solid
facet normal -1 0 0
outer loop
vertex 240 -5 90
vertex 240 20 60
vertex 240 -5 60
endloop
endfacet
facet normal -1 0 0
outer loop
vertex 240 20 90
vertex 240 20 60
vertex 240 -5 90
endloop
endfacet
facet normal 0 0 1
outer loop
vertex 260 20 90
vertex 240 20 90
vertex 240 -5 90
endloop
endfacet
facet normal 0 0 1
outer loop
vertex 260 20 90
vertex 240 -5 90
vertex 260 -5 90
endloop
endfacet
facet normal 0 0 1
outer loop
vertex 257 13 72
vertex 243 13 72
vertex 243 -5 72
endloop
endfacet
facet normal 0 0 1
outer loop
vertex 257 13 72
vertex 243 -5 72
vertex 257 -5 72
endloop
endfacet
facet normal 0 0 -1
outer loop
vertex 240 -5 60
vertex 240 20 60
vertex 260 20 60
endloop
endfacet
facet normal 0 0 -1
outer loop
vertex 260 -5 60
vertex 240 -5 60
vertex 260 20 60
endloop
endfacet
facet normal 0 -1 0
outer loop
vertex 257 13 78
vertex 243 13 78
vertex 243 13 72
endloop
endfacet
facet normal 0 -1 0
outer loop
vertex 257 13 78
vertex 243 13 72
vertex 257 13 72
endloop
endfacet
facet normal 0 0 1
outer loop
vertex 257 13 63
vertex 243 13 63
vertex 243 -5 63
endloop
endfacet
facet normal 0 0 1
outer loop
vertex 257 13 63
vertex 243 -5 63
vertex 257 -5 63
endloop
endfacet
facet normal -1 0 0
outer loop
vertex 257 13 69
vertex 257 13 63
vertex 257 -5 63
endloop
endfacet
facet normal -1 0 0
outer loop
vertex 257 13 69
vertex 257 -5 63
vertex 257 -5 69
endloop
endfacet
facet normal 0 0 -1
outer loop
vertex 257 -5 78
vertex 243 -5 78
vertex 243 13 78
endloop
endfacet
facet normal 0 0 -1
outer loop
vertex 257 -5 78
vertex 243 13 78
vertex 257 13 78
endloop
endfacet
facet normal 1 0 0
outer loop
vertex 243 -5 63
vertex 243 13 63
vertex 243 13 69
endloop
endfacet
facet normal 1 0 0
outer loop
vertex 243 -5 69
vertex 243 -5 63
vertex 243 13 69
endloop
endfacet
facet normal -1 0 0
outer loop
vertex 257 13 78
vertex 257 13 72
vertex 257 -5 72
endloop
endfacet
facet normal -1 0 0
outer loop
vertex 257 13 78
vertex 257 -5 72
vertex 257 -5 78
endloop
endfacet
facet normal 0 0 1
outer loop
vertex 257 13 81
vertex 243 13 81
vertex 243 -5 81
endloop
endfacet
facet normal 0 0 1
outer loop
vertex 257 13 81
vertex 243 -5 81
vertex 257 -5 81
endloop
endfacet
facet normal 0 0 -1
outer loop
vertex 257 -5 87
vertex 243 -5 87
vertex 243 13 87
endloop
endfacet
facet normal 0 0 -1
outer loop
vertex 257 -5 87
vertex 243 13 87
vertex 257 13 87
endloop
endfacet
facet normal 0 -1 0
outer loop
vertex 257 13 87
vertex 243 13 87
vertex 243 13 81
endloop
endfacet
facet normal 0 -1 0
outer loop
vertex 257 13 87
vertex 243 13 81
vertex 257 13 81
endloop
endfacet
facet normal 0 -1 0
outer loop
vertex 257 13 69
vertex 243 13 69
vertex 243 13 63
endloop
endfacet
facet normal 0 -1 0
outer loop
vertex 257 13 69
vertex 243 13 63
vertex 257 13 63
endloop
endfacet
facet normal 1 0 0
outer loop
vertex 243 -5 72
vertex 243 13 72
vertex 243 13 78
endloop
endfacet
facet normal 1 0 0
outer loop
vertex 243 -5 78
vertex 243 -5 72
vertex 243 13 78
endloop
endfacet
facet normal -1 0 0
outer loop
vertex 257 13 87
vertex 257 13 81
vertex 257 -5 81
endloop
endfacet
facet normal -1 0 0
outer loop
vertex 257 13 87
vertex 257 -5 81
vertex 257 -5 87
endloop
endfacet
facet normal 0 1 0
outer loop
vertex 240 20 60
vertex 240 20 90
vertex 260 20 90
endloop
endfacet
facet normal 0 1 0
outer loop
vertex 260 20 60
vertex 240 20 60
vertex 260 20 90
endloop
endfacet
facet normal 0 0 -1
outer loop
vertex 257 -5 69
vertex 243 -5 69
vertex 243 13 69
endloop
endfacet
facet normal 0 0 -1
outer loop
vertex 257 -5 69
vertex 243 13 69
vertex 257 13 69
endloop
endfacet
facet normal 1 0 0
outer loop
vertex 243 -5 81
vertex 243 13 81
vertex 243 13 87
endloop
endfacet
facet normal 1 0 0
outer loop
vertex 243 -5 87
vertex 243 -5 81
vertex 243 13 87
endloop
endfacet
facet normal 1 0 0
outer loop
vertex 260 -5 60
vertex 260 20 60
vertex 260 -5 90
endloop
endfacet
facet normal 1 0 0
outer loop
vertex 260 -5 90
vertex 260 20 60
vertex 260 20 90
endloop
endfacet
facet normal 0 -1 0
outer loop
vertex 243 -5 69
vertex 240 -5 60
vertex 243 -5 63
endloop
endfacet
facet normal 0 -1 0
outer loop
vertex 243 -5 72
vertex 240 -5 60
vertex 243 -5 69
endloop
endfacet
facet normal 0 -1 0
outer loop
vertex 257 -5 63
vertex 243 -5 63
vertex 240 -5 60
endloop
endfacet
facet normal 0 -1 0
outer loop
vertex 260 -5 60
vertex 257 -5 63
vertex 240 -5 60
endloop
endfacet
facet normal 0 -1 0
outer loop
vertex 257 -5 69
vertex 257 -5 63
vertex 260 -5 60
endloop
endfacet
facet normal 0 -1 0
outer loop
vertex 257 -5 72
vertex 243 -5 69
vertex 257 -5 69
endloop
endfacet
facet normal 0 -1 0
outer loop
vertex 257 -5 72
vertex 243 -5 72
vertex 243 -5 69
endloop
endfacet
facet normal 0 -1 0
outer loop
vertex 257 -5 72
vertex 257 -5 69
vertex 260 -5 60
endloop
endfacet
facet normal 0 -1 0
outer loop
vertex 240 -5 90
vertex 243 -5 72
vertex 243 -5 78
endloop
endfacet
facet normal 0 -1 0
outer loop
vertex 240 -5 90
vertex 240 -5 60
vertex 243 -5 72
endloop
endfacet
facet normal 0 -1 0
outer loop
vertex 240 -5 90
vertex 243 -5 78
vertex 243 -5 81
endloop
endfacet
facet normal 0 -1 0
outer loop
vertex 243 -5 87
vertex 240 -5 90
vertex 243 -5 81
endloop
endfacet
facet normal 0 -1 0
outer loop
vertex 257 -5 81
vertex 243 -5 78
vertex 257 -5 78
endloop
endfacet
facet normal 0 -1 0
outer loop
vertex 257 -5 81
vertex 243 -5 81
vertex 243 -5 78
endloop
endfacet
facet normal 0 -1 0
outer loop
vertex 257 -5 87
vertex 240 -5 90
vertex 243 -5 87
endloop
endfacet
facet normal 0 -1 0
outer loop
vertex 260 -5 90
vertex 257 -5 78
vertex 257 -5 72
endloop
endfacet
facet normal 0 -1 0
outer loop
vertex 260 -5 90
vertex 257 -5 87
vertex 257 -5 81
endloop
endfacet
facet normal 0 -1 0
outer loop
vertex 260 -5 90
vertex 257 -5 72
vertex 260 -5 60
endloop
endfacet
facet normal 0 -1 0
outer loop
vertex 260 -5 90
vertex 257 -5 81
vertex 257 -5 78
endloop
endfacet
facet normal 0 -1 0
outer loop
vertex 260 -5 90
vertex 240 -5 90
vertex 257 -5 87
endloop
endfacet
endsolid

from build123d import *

# Parameters (mm, degrees)
BOX020_W          = 14
BOX020_H          = 6
BOX020_DEPTH      = 20
BOX020_ROLL_ANGLE = 90
BOX021_W          = 14
BOX021_H          = 6
BOX021_DEPTH      = 20
BOX021_ROLL_ANGLE = 90
BOX019_W          = 14
BOX019_H          = 6
BOX019_DEPTH      = 20
BOX019_ROLL_ANGLE = 90
BOX018_W          = 20
BOX018_H          = 30
BOX018_DEPTH      = 25
BOX018_ROLL_ANGLE = 90


with BuildPart() as usb_plug002:
    # Box020 → Box020 (new body)
    with BuildSketch(Plane.XY):
        with Locations((7, 3)):
            Rectangle(BOX020_W, BOX020_H)
    extrude(amount=BOX020_DEPTH)


with BuildPart() as usb_plug002_1:
    # Box020 roll: moved
    add(usb_plug002.part.rotate(Axis((0, 0, 0), (1, 0, 0)), BOX020_ROLL_ANGLE))


with BuildPart() as usb_plug002_2:
    # Box020 placement: moved
    add(usb_plug002_1.part.moved(Location((243, 13, 112))))


with BuildPart() as usb_plug003:
    # Box021 → Box021 (new body)
    with BuildSketch(Plane.XY):
        with Locations((7, 3)):
            Rectangle(BOX021_W, BOX021_H)
    extrude(amount=BOX021_DEPTH)


with BuildPart() as usb_plug003_1:
    # Box021 roll: moved
    add(usb_plug003.part.rotate(Axis((0, 0, 0), (1, 0, 0)), BOX021_ROLL_ANGLE))


with BuildPart() as usb_plug003_2:
    # Box021 placement: moved
    add(usb_plug003_1.part.moved(Location((243, 13, 121))))


with BuildPart() as usb_plug001:
    # Box019 → Box019 (new body)
    with BuildSketch(Plane.XY):
        with Locations((7, 3)):
            Rectangle(BOX019_W, BOX019_H)
    extrude(amount=BOX019_DEPTH)


with BuildPart() as usb_plug001_1:
    # Box019 roll: moved
    add(usb_plug001.part.rotate(Axis((0, 0, 0), (1, 0, 0)), BOX019_ROLL_ANGLE))


with BuildPart() as usb_plug001_2:
    # Box019 placement: moved
    add(usb_plug001_1.part.moved(Location((243, 13, 103))))


with BuildPart() as usb_plug:
    # Box018 → Box018 (new body)
    with BuildSketch(Plane.XY):
        with Locations((10, 15)):
            Rectangle(BOX018_W, BOX018_H)
    extrude(amount=BOX018_DEPTH)


with BuildPart() as usb_plug_1:
    # Box018 roll: moved
    add(usb_plug.part.rotate(Axis((0, 0, 0), (1, 0, 0)), BOX018_ROLL_ANGLE))


with BuildPart() as usb_plug_2:
    # Box018 placement: moved
    add(usb_plug_1.part.moved(Location((240, 20, 100))))

    # Cut012: cut USB Plug001
    add(usb_plug001_2.part, mode=Mode.SUBTRACT)

    # Cut013: cut USB Plug003
    add(usb_plug003_2.part, mode=Mode.SUBTRACT)

    # Cut014: cut USB Plug002
    add(usb_plug002_2.part, mode=Mode.SUBTRACT)


with BuildPart() as usb_plug_3:
    # Cut014 placement: moved
    add(usb_plug_2.part.moved(Location((0, 0, -40))))


solid = usb_plug_3.part
